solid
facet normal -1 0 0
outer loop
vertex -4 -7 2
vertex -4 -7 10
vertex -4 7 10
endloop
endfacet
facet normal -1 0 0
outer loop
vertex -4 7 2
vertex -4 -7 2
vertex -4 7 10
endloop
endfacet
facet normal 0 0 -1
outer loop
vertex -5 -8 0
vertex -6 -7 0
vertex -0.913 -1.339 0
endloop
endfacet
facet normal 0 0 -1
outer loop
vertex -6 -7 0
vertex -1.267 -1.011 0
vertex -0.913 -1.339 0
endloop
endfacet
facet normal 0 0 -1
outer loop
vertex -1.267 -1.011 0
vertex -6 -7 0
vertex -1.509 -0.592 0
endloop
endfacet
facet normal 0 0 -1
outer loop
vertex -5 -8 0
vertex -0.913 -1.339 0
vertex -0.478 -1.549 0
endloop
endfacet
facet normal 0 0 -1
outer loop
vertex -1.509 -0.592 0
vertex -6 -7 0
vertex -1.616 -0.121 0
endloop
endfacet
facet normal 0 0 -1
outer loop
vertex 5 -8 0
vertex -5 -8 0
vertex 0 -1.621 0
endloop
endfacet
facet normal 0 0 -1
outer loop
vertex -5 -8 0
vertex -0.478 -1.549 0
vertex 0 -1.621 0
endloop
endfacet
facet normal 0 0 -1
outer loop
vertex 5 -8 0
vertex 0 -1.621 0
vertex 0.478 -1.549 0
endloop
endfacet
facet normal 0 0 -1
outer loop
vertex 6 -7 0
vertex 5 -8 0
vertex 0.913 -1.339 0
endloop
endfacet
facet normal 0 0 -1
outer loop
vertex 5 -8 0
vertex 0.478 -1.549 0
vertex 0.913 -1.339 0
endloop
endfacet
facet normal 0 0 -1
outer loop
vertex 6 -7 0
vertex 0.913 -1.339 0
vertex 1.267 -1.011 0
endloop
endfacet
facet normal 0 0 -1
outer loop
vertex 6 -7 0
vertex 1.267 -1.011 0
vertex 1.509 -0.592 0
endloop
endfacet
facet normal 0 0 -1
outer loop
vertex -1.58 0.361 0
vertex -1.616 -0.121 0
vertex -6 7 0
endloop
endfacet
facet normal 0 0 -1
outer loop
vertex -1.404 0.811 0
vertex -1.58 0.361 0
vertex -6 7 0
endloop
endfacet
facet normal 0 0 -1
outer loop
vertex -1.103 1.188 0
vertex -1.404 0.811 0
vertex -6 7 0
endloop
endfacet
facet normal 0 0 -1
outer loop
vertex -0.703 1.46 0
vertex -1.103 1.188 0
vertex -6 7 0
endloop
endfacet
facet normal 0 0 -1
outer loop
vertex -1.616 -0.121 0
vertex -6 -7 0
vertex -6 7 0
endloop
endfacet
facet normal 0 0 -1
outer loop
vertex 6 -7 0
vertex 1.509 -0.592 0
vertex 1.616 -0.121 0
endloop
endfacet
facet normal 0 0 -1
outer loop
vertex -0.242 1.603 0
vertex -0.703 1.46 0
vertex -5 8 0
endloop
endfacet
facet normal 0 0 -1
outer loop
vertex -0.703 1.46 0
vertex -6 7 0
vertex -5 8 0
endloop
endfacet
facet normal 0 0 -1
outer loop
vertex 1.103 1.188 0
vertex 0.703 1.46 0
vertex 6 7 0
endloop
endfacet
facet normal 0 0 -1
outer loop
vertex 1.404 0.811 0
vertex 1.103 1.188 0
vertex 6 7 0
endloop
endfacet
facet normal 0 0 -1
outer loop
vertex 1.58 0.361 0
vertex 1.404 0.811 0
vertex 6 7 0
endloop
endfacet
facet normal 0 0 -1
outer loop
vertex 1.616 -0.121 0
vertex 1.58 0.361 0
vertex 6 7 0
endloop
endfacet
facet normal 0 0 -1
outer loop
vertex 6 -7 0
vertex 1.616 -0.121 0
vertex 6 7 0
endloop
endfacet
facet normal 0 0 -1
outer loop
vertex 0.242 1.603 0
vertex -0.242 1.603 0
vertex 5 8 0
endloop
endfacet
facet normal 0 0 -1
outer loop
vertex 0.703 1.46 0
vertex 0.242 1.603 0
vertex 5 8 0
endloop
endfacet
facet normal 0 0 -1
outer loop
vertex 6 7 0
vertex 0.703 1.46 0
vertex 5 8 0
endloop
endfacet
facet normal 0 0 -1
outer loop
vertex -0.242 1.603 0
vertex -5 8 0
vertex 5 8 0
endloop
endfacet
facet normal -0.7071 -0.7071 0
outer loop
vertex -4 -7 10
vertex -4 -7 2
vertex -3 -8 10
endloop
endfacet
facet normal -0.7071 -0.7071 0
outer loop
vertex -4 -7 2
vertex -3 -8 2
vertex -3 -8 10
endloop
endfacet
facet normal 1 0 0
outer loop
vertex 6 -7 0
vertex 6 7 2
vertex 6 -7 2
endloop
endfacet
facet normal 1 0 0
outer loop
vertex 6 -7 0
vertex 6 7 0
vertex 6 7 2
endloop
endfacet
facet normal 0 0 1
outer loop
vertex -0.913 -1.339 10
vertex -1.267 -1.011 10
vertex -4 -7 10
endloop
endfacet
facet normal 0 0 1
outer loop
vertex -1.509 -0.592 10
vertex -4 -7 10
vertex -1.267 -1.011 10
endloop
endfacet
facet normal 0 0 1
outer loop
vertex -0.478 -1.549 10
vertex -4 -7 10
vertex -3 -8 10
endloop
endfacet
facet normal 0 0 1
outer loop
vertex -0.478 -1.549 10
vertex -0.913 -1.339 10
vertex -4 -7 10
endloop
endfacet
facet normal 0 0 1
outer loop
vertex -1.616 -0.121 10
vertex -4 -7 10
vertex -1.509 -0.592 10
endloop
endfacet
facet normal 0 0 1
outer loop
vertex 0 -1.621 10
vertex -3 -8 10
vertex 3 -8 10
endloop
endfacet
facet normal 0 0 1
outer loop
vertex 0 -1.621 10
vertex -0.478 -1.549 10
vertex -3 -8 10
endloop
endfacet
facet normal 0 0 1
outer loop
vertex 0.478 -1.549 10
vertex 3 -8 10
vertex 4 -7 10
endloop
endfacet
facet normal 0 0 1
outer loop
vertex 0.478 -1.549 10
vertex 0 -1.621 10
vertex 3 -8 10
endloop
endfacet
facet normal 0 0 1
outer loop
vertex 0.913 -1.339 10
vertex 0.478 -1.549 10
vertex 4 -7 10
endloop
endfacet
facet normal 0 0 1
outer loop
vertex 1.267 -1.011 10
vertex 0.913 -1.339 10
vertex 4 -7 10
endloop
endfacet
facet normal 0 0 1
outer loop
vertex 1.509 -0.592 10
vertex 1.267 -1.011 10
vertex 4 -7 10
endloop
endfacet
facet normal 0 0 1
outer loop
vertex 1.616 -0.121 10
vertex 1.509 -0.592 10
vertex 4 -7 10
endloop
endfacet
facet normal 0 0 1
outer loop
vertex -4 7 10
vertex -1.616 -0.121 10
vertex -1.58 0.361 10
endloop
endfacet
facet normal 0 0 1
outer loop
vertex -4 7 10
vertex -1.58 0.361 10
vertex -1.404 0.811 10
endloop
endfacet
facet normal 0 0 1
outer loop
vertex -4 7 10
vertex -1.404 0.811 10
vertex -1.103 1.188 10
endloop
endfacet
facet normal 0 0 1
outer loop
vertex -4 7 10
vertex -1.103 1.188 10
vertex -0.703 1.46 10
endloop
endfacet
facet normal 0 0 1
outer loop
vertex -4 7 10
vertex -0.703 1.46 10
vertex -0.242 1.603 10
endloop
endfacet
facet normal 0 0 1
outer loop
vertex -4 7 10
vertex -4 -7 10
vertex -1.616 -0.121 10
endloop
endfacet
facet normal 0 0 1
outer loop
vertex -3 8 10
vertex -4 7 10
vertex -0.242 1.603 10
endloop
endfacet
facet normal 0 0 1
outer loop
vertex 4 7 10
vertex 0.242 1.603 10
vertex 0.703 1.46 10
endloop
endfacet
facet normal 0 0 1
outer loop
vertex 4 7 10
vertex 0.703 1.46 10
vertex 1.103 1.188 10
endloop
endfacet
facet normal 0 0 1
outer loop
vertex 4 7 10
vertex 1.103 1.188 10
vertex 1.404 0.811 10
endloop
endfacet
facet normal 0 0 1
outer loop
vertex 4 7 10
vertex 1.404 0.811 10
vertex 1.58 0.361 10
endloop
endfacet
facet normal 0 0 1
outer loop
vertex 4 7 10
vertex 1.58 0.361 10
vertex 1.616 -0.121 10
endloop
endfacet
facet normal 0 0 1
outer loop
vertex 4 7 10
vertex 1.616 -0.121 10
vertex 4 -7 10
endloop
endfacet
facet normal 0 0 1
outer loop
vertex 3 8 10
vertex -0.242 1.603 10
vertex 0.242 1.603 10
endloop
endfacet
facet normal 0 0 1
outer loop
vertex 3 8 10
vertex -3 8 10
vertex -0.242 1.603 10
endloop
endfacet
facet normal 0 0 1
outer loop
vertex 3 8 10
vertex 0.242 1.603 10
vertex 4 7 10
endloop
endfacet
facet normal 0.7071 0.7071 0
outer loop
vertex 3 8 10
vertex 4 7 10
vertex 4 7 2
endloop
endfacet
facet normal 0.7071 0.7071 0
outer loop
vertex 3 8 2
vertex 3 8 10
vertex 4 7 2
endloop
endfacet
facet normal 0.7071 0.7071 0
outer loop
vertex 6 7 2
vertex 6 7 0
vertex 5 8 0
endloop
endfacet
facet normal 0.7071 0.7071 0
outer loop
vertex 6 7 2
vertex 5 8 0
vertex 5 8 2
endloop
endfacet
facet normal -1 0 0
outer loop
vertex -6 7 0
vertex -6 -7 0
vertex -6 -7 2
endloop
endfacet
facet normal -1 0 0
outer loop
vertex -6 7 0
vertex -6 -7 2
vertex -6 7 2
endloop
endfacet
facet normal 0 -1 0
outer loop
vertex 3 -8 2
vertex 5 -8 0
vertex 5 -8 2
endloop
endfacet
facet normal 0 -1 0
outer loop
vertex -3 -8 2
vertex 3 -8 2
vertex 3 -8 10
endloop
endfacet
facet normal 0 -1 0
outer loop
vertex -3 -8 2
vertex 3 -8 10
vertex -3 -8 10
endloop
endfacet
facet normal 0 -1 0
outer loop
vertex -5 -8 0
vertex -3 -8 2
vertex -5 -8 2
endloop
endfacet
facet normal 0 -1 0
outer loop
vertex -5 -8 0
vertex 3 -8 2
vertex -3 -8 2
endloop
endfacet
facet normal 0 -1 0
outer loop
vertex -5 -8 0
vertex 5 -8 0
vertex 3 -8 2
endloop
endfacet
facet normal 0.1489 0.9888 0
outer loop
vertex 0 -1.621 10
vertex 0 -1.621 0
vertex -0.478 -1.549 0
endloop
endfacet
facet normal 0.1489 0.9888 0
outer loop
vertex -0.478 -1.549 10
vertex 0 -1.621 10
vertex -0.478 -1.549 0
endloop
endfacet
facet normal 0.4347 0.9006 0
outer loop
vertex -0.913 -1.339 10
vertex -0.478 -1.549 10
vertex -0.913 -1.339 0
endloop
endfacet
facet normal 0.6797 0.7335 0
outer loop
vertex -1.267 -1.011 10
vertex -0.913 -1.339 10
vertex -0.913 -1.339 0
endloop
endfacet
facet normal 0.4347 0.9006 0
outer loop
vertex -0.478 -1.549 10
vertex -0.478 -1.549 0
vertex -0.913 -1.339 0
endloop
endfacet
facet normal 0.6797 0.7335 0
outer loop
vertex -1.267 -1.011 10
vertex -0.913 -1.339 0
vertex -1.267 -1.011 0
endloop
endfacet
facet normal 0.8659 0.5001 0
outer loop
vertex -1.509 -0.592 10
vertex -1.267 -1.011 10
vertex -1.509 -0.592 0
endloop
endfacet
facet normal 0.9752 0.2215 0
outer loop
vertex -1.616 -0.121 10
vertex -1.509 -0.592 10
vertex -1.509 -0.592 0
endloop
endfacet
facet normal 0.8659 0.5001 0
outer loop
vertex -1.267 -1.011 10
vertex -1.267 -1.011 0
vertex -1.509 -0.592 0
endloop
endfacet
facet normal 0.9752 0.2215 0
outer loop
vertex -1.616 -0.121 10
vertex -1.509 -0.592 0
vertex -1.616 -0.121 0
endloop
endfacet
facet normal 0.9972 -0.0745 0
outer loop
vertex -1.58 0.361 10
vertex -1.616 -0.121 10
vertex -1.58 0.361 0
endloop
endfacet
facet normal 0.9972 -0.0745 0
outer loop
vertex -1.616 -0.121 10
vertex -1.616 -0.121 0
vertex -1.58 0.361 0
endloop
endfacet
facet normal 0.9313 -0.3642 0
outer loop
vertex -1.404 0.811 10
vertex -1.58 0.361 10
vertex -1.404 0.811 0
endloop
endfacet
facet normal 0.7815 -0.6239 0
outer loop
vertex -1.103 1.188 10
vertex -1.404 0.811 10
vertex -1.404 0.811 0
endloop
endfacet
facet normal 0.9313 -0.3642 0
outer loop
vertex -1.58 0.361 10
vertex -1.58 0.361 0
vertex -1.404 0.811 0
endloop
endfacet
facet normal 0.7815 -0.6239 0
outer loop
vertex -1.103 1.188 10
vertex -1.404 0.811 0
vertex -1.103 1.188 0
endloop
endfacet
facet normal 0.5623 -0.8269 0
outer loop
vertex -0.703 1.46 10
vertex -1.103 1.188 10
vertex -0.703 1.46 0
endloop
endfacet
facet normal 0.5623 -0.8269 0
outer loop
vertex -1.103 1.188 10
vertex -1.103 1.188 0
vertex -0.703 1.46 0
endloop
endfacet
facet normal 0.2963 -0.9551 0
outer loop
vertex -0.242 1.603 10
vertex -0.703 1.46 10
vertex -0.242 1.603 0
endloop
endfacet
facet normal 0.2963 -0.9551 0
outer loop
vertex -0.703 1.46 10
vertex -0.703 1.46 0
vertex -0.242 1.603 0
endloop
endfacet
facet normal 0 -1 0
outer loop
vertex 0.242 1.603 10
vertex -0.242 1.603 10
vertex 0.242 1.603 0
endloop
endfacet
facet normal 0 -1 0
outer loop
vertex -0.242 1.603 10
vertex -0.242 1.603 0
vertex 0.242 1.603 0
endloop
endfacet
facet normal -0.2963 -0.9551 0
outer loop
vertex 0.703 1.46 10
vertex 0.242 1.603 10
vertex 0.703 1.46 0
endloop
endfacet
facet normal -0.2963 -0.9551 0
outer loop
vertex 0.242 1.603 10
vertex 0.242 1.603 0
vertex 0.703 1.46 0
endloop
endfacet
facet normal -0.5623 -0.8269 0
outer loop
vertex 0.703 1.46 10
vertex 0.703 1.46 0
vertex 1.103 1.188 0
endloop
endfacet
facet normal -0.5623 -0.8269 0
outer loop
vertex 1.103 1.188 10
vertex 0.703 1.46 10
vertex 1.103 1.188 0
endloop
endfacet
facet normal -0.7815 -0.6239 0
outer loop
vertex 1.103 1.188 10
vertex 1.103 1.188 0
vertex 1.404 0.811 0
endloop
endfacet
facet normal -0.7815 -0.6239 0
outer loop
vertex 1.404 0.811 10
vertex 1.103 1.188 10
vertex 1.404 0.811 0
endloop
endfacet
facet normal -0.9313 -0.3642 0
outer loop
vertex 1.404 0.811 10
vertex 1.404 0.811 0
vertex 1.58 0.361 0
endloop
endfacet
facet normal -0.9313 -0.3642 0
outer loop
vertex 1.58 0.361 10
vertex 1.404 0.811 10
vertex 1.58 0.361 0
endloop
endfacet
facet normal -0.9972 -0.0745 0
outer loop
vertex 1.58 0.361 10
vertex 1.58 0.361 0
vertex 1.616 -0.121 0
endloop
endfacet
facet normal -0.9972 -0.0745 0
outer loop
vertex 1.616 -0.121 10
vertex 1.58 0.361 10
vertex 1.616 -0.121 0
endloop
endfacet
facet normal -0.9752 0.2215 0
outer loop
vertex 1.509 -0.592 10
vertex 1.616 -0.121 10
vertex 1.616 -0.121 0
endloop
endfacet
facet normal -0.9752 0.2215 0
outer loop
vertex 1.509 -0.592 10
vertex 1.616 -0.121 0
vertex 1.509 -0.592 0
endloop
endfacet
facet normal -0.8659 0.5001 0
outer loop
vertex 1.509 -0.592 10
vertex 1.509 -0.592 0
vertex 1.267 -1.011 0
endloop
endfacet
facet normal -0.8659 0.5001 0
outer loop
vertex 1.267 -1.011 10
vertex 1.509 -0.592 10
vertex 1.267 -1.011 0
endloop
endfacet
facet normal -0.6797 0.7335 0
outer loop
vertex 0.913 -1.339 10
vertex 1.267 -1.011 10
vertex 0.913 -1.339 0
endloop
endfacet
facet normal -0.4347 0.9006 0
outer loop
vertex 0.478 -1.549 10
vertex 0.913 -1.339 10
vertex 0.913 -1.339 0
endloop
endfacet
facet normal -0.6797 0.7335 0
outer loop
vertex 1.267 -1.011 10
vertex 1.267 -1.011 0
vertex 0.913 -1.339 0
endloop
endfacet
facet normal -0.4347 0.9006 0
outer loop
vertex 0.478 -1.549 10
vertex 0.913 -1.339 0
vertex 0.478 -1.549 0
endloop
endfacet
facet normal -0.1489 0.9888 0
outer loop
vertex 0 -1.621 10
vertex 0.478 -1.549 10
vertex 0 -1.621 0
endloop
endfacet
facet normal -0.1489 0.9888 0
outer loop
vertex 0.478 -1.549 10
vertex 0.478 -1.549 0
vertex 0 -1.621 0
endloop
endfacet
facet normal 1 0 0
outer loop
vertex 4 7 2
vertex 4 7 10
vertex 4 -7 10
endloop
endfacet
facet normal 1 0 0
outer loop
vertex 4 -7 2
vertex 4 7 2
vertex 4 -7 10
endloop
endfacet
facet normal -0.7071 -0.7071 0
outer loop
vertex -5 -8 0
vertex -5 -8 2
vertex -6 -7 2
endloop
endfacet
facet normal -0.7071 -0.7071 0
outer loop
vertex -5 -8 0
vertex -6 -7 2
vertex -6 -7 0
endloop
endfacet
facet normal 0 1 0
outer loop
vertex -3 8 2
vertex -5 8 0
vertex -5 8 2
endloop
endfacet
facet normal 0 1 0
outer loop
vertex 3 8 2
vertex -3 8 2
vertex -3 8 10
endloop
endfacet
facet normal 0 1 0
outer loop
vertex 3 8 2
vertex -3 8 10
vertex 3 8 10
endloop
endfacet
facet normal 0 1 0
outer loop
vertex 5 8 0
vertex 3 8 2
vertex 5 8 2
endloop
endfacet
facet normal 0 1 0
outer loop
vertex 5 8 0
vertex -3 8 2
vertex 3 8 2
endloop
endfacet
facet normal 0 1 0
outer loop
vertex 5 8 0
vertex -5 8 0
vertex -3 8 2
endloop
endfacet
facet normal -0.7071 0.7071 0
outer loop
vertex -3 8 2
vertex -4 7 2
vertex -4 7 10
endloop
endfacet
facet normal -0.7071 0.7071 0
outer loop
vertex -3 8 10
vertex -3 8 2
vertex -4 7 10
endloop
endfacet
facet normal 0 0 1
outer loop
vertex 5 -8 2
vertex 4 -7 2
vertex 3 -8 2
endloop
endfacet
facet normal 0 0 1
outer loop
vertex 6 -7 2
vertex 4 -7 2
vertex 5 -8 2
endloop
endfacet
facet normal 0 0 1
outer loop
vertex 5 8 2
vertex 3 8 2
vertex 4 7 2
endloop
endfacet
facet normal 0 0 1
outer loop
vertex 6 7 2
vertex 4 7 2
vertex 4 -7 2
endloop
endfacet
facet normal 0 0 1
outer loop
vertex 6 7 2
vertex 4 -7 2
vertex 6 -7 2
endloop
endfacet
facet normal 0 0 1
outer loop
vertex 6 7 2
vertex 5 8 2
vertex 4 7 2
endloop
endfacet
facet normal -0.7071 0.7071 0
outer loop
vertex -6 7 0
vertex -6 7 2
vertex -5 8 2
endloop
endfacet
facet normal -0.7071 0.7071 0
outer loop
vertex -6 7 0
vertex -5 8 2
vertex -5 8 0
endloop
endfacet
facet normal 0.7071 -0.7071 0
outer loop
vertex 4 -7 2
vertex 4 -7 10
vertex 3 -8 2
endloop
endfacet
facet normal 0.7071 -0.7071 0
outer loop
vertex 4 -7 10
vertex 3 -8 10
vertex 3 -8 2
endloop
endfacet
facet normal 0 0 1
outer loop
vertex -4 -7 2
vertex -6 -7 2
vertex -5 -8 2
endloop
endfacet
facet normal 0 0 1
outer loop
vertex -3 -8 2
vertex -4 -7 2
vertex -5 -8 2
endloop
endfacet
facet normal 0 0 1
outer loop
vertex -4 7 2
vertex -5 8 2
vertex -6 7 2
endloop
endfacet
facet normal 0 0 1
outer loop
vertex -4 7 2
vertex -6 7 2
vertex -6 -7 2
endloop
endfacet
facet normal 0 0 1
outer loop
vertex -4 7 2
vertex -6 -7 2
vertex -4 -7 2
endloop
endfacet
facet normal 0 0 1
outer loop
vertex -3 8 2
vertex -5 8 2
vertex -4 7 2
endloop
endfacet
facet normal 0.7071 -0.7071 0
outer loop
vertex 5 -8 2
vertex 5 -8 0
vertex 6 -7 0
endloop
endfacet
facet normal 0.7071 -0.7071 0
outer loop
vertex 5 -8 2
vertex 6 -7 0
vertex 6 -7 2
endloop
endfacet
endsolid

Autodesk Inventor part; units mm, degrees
ref_plane "YZ Plane" through (0, 0, 0) normal (1, 0, 0) x (0, 1, 0)
ref_plane "XZ Plane" through (0, 0, 0) normal (0, 1, 0) x (-1, 0, 0)
ref_plane "XY Plane" through (0, 0, 0) normal (0, 0, 1) x (1, 0, 0)
sketch "Esboço1" plane through (0, 0, 0) normal (0, 0, 1) x (1, 0, 0)
  line L0 (-6, 8) -> (6, 8)
  line L1 (6, 8) -> (6, -8)
  line L2 (6, -8) -> (-6, -8)
  line L3 (-6, -8) -> (-6, 8)
  line L4 (-6, 8) -> (6, -8) construction
  line L5 (6, 8) -> (-6, -8) construction
  point P0 (0, 0)
  dimension "d0" = 12
  dimension "d1" = 16
extrude "Extrusão1" add sketch "Esboço1" along normal blind 10
sketch "Esboço3" plane through (0, 0, 10) normal (0, 0, 1) x (1, 0, 0)
  line L0 (6, -8) -> (-6, -8)
  line L1 (-6, -8) -> (-6, 8)
  line L2 (-6, 8) -> (6, 8)
  line L3 (6, 8) -> (6, -8)
  line L4 (6, -8) -> (-6, 8) construction
  line L5 (-6, -8) -> (6, 8) construction
  line L6 (4, -8) -> (-4, -8)
  line L7 (-4, -8) -> (-4, 8)
  line L8 (-4, 8) -> (4, 8)
  line L9 (4, 8) -> (4, -8)
  line L10 (4, -8) -> (-4, 8) construction
  line L11 (-4, -8) -> (4, 8) construction
  point P0 (0, 0)
  dimension "d4" = 12
  dimension "d5" = 16
  dimension "d6" = 8
extrude "Extrusão2" cut sketch "Esboço3" against normal blind 8 contours L0 L9 L2 L3 | L0 L1 L2 L7
chamfer "Chanfro1" distance 1 angle 45 8 edges at (6, -8, 1) (-6, -8, 1) (6, 8, 1) (-6, 8, 1) (-4, -8, 6) (-4, 8, 6) (4, 8, 6) (4, -8, 6)
sketch "Esboço4" plane through (0, 0, 10) normal (0, 0, 1) x (1, 0, 0)
  circle A0 centre (0, 0) radius 1.5 construction
  dimension "d12" = 3
hole "Furo1" at (0, 0, 10) direction (0, 0, -1) diameter 3.242 end through all thread size "M4x0.7" class "6H" standard "ANSI Metric M Profile"
